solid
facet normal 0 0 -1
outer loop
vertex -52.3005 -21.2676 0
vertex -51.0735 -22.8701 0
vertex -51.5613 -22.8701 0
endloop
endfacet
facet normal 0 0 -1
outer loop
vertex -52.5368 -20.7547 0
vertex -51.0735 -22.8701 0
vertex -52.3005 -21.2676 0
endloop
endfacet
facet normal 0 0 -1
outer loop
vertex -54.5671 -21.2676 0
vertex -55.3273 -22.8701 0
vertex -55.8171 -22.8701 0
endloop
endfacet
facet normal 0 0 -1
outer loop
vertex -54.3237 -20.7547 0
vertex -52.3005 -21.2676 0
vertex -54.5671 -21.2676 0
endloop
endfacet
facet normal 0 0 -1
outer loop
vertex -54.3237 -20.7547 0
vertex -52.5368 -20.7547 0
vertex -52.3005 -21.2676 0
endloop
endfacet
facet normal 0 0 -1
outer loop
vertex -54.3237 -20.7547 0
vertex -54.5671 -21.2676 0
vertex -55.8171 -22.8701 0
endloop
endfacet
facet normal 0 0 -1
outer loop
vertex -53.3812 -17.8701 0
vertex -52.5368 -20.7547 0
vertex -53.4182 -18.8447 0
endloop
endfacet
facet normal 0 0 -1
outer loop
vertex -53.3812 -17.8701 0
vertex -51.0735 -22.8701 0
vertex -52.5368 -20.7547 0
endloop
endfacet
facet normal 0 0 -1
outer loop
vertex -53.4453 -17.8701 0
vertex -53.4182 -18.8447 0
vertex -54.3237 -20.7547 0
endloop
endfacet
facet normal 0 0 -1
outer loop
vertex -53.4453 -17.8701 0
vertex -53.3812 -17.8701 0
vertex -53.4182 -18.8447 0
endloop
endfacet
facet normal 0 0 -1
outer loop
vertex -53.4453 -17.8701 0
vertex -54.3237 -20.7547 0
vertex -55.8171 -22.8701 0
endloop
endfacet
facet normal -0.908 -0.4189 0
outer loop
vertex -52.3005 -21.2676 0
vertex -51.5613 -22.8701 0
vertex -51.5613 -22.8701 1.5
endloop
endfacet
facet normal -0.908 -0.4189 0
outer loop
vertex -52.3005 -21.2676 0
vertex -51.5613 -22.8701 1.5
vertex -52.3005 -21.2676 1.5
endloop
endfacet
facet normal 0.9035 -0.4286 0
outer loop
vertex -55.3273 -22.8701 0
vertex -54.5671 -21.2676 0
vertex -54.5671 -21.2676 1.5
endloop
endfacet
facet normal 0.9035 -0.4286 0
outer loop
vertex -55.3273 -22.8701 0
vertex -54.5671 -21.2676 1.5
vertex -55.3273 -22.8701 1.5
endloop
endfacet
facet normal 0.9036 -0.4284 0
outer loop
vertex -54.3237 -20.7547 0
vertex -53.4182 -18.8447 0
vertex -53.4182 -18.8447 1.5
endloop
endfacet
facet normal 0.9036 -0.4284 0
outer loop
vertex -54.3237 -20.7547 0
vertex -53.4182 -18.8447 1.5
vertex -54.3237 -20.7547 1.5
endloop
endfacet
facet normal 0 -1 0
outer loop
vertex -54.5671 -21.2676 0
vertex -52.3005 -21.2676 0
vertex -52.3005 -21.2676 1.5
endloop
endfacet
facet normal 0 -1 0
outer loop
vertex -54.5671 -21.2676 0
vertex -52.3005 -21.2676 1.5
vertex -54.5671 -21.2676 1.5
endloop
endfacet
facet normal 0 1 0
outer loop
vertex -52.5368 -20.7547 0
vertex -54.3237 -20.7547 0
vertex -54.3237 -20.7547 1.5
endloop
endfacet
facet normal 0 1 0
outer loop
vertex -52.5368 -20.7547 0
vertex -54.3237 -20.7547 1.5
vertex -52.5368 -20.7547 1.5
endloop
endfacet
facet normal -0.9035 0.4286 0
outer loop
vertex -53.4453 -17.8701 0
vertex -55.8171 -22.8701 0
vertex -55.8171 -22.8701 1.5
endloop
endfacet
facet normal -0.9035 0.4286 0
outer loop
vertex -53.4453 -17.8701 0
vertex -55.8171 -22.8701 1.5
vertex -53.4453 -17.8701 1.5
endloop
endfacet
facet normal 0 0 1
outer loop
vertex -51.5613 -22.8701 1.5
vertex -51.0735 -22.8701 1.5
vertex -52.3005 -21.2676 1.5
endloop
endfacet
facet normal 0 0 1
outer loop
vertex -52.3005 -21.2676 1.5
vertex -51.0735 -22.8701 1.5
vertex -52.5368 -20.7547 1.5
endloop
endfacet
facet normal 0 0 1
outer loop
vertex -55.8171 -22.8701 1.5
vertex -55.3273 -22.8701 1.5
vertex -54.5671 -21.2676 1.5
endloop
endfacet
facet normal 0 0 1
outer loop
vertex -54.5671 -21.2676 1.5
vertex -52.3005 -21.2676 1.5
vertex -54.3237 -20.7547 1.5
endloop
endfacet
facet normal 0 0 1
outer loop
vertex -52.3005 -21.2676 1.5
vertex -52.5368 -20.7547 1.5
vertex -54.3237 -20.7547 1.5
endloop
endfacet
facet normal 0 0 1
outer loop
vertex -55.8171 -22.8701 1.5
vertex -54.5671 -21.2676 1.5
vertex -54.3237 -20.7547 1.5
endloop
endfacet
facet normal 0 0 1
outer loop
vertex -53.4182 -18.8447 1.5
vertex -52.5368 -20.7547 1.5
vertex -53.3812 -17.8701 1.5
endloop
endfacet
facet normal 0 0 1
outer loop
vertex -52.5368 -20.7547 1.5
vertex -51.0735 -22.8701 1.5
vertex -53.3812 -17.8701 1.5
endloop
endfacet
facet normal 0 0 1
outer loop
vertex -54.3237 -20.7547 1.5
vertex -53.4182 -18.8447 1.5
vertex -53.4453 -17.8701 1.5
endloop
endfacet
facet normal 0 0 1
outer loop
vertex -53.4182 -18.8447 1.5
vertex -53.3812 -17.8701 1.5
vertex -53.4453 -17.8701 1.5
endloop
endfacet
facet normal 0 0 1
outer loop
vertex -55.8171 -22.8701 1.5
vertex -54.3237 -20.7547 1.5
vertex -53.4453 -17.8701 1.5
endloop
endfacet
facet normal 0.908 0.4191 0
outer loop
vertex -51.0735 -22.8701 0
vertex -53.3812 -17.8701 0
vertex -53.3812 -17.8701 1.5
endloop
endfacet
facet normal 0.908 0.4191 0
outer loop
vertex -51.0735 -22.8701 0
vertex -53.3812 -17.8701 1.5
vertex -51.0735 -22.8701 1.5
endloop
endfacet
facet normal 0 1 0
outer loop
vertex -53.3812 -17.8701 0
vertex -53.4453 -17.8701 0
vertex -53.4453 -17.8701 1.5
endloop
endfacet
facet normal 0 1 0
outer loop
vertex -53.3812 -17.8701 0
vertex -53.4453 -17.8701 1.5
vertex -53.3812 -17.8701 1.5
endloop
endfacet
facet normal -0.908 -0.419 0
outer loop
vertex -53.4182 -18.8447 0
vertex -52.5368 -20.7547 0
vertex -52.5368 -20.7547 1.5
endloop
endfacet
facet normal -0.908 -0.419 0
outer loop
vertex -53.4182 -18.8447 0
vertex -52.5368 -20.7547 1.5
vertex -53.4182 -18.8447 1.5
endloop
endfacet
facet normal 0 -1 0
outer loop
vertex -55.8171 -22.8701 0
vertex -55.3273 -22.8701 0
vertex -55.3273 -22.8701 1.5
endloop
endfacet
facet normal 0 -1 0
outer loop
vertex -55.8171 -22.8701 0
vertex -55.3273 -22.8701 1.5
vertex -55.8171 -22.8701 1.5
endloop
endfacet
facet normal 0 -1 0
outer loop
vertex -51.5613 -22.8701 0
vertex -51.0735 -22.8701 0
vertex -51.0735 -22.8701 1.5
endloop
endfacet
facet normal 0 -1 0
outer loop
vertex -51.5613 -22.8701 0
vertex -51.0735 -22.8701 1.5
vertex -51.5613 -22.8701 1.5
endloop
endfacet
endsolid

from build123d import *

# Parameters (mm, degrees)
BOSS_EXTRU_1_DEPTH = 1.5


with BuildPart() as part:
    # Esquisse1 → Boss.-Extru.1 (new body)
    with BuildSketch(Plane.XY):
        Polygon((-53.381183275, -17.870119076), (-51.073490967, -22.870119076), (-51.561271416, -22.870119076), (-52.300454108, -21.267554974), (-54.56708071, -21.267554974), (-55.327297057, -22.870119076), (-55.81708071, -22.870119076), (-53.445285839, -17.870119076), align=None)
        Polygon((-53.418242569, -18.844678371), (-54.323691287, -20.754734461), (-52.536832313, -20.754734461), align=None, mode=Mode.SUBTRACT)
    extrude(amount=BOSS_EXTRU_1_DEPTH)


solid = part.part
